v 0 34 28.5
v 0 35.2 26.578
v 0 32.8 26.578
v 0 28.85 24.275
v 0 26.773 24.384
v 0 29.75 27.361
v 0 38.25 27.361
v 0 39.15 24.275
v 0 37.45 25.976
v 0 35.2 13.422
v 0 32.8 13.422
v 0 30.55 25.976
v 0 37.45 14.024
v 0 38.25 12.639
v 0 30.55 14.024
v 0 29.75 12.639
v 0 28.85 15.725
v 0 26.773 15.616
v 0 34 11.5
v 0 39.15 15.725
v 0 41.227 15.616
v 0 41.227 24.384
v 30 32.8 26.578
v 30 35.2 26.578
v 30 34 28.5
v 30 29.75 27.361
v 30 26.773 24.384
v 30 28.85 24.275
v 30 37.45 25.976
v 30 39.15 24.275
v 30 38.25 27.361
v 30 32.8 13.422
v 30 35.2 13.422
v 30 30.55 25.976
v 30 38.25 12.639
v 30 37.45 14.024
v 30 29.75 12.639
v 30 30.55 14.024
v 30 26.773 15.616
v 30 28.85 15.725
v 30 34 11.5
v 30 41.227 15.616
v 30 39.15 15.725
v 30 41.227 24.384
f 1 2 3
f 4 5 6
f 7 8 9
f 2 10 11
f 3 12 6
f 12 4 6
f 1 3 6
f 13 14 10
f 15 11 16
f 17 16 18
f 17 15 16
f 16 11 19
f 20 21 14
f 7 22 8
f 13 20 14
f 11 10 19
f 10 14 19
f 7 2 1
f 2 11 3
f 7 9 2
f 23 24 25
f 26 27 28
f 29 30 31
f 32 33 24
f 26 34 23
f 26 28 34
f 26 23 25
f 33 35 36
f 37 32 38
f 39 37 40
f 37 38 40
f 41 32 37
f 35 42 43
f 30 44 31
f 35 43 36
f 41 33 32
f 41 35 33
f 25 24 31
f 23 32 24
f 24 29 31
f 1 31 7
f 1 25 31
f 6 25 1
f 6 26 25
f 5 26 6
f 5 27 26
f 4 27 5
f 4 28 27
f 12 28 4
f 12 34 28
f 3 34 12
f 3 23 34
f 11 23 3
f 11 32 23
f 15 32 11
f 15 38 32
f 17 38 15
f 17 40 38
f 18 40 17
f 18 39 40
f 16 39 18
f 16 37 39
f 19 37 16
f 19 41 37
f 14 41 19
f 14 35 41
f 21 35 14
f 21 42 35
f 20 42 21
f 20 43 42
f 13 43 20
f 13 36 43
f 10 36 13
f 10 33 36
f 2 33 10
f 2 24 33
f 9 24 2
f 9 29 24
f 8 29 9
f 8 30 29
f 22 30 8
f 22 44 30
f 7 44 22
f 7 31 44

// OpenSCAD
INSET = -0.4;

XS = [1, 4, 10, 13];
YS = [0, 3, 5];
H = YS[2] - YS[0];
W = XS[3] - XS[0];

module base() {
  polygon([
    [XS[1], YS[0]],
    [XS[2], YS[0]],
    [XS[3], YS[1]],
    [XS[3], YS[2]],
    [XS[2], YS[1]],
    [XS[1], YS[1]],
    [XS[0], YS[2]],
    [XS[0], YS[1]]
  ]);
}

*rotate([0, 90, 0])
translate([-(8.5 - (17 - (W * 1.2)) / 2), 15, 0]) linear_extrude(10)
difference() {
  translate([8.5 - (17 - (W * 1.2)) / 2, 0, 0]) color("red") circle(d = 17, $fn = 64);
  scale(1.2) translate([-1, -5.25, 0]) base();
  mirror([0, 1, 0]) scale(1.2) translate([-1, -5.25, 0]) base();
}
*rotate([0, 90, 0])
translate([-(8.5 - (17 - (W * 1.1)) / 2), 52, 0]) linear_extrude(10)
difference() {
  translate([8.5 - (17 - (W * 1.1)) / 2, 0, 0]) color("red") circle(d = 17, $fn = 64);
  scale(1.1) translate([-1, -5.5, 0]) base();
  mirror([0, 1, 0]) scale(1.1) translate([-1, -5.5, 0]) base();
}

*rotate([0, 90, 0])
translate([20, 34, 0])
linear_extrude(10)
group() {
  difference() {
    circle(d = 17, $fn = 64);
    circle(d = 14.6, $fn = 32);
  }
  
  translate([0, 0, 0]) circle(d = 4, $fn = 32);
  translate([-8.4, -.6, 0]) square([16.8, 1.2]);
}

rotate([180, 270, 0]) translate([20, -34, 0])
linear_extrude(30)
group() {
  difference() {
    circle(d = 17, $fn = 12);
    circle(d = 13.8, $fn = 12);
    rotate([0, 0, 93]) square([20, 8], center = true);
    rotate([0, 0, 87]) square([20, 8], center = true);
  }
  
  translate([-8, -1.2, 0]) square([16, 2.4]);
}
